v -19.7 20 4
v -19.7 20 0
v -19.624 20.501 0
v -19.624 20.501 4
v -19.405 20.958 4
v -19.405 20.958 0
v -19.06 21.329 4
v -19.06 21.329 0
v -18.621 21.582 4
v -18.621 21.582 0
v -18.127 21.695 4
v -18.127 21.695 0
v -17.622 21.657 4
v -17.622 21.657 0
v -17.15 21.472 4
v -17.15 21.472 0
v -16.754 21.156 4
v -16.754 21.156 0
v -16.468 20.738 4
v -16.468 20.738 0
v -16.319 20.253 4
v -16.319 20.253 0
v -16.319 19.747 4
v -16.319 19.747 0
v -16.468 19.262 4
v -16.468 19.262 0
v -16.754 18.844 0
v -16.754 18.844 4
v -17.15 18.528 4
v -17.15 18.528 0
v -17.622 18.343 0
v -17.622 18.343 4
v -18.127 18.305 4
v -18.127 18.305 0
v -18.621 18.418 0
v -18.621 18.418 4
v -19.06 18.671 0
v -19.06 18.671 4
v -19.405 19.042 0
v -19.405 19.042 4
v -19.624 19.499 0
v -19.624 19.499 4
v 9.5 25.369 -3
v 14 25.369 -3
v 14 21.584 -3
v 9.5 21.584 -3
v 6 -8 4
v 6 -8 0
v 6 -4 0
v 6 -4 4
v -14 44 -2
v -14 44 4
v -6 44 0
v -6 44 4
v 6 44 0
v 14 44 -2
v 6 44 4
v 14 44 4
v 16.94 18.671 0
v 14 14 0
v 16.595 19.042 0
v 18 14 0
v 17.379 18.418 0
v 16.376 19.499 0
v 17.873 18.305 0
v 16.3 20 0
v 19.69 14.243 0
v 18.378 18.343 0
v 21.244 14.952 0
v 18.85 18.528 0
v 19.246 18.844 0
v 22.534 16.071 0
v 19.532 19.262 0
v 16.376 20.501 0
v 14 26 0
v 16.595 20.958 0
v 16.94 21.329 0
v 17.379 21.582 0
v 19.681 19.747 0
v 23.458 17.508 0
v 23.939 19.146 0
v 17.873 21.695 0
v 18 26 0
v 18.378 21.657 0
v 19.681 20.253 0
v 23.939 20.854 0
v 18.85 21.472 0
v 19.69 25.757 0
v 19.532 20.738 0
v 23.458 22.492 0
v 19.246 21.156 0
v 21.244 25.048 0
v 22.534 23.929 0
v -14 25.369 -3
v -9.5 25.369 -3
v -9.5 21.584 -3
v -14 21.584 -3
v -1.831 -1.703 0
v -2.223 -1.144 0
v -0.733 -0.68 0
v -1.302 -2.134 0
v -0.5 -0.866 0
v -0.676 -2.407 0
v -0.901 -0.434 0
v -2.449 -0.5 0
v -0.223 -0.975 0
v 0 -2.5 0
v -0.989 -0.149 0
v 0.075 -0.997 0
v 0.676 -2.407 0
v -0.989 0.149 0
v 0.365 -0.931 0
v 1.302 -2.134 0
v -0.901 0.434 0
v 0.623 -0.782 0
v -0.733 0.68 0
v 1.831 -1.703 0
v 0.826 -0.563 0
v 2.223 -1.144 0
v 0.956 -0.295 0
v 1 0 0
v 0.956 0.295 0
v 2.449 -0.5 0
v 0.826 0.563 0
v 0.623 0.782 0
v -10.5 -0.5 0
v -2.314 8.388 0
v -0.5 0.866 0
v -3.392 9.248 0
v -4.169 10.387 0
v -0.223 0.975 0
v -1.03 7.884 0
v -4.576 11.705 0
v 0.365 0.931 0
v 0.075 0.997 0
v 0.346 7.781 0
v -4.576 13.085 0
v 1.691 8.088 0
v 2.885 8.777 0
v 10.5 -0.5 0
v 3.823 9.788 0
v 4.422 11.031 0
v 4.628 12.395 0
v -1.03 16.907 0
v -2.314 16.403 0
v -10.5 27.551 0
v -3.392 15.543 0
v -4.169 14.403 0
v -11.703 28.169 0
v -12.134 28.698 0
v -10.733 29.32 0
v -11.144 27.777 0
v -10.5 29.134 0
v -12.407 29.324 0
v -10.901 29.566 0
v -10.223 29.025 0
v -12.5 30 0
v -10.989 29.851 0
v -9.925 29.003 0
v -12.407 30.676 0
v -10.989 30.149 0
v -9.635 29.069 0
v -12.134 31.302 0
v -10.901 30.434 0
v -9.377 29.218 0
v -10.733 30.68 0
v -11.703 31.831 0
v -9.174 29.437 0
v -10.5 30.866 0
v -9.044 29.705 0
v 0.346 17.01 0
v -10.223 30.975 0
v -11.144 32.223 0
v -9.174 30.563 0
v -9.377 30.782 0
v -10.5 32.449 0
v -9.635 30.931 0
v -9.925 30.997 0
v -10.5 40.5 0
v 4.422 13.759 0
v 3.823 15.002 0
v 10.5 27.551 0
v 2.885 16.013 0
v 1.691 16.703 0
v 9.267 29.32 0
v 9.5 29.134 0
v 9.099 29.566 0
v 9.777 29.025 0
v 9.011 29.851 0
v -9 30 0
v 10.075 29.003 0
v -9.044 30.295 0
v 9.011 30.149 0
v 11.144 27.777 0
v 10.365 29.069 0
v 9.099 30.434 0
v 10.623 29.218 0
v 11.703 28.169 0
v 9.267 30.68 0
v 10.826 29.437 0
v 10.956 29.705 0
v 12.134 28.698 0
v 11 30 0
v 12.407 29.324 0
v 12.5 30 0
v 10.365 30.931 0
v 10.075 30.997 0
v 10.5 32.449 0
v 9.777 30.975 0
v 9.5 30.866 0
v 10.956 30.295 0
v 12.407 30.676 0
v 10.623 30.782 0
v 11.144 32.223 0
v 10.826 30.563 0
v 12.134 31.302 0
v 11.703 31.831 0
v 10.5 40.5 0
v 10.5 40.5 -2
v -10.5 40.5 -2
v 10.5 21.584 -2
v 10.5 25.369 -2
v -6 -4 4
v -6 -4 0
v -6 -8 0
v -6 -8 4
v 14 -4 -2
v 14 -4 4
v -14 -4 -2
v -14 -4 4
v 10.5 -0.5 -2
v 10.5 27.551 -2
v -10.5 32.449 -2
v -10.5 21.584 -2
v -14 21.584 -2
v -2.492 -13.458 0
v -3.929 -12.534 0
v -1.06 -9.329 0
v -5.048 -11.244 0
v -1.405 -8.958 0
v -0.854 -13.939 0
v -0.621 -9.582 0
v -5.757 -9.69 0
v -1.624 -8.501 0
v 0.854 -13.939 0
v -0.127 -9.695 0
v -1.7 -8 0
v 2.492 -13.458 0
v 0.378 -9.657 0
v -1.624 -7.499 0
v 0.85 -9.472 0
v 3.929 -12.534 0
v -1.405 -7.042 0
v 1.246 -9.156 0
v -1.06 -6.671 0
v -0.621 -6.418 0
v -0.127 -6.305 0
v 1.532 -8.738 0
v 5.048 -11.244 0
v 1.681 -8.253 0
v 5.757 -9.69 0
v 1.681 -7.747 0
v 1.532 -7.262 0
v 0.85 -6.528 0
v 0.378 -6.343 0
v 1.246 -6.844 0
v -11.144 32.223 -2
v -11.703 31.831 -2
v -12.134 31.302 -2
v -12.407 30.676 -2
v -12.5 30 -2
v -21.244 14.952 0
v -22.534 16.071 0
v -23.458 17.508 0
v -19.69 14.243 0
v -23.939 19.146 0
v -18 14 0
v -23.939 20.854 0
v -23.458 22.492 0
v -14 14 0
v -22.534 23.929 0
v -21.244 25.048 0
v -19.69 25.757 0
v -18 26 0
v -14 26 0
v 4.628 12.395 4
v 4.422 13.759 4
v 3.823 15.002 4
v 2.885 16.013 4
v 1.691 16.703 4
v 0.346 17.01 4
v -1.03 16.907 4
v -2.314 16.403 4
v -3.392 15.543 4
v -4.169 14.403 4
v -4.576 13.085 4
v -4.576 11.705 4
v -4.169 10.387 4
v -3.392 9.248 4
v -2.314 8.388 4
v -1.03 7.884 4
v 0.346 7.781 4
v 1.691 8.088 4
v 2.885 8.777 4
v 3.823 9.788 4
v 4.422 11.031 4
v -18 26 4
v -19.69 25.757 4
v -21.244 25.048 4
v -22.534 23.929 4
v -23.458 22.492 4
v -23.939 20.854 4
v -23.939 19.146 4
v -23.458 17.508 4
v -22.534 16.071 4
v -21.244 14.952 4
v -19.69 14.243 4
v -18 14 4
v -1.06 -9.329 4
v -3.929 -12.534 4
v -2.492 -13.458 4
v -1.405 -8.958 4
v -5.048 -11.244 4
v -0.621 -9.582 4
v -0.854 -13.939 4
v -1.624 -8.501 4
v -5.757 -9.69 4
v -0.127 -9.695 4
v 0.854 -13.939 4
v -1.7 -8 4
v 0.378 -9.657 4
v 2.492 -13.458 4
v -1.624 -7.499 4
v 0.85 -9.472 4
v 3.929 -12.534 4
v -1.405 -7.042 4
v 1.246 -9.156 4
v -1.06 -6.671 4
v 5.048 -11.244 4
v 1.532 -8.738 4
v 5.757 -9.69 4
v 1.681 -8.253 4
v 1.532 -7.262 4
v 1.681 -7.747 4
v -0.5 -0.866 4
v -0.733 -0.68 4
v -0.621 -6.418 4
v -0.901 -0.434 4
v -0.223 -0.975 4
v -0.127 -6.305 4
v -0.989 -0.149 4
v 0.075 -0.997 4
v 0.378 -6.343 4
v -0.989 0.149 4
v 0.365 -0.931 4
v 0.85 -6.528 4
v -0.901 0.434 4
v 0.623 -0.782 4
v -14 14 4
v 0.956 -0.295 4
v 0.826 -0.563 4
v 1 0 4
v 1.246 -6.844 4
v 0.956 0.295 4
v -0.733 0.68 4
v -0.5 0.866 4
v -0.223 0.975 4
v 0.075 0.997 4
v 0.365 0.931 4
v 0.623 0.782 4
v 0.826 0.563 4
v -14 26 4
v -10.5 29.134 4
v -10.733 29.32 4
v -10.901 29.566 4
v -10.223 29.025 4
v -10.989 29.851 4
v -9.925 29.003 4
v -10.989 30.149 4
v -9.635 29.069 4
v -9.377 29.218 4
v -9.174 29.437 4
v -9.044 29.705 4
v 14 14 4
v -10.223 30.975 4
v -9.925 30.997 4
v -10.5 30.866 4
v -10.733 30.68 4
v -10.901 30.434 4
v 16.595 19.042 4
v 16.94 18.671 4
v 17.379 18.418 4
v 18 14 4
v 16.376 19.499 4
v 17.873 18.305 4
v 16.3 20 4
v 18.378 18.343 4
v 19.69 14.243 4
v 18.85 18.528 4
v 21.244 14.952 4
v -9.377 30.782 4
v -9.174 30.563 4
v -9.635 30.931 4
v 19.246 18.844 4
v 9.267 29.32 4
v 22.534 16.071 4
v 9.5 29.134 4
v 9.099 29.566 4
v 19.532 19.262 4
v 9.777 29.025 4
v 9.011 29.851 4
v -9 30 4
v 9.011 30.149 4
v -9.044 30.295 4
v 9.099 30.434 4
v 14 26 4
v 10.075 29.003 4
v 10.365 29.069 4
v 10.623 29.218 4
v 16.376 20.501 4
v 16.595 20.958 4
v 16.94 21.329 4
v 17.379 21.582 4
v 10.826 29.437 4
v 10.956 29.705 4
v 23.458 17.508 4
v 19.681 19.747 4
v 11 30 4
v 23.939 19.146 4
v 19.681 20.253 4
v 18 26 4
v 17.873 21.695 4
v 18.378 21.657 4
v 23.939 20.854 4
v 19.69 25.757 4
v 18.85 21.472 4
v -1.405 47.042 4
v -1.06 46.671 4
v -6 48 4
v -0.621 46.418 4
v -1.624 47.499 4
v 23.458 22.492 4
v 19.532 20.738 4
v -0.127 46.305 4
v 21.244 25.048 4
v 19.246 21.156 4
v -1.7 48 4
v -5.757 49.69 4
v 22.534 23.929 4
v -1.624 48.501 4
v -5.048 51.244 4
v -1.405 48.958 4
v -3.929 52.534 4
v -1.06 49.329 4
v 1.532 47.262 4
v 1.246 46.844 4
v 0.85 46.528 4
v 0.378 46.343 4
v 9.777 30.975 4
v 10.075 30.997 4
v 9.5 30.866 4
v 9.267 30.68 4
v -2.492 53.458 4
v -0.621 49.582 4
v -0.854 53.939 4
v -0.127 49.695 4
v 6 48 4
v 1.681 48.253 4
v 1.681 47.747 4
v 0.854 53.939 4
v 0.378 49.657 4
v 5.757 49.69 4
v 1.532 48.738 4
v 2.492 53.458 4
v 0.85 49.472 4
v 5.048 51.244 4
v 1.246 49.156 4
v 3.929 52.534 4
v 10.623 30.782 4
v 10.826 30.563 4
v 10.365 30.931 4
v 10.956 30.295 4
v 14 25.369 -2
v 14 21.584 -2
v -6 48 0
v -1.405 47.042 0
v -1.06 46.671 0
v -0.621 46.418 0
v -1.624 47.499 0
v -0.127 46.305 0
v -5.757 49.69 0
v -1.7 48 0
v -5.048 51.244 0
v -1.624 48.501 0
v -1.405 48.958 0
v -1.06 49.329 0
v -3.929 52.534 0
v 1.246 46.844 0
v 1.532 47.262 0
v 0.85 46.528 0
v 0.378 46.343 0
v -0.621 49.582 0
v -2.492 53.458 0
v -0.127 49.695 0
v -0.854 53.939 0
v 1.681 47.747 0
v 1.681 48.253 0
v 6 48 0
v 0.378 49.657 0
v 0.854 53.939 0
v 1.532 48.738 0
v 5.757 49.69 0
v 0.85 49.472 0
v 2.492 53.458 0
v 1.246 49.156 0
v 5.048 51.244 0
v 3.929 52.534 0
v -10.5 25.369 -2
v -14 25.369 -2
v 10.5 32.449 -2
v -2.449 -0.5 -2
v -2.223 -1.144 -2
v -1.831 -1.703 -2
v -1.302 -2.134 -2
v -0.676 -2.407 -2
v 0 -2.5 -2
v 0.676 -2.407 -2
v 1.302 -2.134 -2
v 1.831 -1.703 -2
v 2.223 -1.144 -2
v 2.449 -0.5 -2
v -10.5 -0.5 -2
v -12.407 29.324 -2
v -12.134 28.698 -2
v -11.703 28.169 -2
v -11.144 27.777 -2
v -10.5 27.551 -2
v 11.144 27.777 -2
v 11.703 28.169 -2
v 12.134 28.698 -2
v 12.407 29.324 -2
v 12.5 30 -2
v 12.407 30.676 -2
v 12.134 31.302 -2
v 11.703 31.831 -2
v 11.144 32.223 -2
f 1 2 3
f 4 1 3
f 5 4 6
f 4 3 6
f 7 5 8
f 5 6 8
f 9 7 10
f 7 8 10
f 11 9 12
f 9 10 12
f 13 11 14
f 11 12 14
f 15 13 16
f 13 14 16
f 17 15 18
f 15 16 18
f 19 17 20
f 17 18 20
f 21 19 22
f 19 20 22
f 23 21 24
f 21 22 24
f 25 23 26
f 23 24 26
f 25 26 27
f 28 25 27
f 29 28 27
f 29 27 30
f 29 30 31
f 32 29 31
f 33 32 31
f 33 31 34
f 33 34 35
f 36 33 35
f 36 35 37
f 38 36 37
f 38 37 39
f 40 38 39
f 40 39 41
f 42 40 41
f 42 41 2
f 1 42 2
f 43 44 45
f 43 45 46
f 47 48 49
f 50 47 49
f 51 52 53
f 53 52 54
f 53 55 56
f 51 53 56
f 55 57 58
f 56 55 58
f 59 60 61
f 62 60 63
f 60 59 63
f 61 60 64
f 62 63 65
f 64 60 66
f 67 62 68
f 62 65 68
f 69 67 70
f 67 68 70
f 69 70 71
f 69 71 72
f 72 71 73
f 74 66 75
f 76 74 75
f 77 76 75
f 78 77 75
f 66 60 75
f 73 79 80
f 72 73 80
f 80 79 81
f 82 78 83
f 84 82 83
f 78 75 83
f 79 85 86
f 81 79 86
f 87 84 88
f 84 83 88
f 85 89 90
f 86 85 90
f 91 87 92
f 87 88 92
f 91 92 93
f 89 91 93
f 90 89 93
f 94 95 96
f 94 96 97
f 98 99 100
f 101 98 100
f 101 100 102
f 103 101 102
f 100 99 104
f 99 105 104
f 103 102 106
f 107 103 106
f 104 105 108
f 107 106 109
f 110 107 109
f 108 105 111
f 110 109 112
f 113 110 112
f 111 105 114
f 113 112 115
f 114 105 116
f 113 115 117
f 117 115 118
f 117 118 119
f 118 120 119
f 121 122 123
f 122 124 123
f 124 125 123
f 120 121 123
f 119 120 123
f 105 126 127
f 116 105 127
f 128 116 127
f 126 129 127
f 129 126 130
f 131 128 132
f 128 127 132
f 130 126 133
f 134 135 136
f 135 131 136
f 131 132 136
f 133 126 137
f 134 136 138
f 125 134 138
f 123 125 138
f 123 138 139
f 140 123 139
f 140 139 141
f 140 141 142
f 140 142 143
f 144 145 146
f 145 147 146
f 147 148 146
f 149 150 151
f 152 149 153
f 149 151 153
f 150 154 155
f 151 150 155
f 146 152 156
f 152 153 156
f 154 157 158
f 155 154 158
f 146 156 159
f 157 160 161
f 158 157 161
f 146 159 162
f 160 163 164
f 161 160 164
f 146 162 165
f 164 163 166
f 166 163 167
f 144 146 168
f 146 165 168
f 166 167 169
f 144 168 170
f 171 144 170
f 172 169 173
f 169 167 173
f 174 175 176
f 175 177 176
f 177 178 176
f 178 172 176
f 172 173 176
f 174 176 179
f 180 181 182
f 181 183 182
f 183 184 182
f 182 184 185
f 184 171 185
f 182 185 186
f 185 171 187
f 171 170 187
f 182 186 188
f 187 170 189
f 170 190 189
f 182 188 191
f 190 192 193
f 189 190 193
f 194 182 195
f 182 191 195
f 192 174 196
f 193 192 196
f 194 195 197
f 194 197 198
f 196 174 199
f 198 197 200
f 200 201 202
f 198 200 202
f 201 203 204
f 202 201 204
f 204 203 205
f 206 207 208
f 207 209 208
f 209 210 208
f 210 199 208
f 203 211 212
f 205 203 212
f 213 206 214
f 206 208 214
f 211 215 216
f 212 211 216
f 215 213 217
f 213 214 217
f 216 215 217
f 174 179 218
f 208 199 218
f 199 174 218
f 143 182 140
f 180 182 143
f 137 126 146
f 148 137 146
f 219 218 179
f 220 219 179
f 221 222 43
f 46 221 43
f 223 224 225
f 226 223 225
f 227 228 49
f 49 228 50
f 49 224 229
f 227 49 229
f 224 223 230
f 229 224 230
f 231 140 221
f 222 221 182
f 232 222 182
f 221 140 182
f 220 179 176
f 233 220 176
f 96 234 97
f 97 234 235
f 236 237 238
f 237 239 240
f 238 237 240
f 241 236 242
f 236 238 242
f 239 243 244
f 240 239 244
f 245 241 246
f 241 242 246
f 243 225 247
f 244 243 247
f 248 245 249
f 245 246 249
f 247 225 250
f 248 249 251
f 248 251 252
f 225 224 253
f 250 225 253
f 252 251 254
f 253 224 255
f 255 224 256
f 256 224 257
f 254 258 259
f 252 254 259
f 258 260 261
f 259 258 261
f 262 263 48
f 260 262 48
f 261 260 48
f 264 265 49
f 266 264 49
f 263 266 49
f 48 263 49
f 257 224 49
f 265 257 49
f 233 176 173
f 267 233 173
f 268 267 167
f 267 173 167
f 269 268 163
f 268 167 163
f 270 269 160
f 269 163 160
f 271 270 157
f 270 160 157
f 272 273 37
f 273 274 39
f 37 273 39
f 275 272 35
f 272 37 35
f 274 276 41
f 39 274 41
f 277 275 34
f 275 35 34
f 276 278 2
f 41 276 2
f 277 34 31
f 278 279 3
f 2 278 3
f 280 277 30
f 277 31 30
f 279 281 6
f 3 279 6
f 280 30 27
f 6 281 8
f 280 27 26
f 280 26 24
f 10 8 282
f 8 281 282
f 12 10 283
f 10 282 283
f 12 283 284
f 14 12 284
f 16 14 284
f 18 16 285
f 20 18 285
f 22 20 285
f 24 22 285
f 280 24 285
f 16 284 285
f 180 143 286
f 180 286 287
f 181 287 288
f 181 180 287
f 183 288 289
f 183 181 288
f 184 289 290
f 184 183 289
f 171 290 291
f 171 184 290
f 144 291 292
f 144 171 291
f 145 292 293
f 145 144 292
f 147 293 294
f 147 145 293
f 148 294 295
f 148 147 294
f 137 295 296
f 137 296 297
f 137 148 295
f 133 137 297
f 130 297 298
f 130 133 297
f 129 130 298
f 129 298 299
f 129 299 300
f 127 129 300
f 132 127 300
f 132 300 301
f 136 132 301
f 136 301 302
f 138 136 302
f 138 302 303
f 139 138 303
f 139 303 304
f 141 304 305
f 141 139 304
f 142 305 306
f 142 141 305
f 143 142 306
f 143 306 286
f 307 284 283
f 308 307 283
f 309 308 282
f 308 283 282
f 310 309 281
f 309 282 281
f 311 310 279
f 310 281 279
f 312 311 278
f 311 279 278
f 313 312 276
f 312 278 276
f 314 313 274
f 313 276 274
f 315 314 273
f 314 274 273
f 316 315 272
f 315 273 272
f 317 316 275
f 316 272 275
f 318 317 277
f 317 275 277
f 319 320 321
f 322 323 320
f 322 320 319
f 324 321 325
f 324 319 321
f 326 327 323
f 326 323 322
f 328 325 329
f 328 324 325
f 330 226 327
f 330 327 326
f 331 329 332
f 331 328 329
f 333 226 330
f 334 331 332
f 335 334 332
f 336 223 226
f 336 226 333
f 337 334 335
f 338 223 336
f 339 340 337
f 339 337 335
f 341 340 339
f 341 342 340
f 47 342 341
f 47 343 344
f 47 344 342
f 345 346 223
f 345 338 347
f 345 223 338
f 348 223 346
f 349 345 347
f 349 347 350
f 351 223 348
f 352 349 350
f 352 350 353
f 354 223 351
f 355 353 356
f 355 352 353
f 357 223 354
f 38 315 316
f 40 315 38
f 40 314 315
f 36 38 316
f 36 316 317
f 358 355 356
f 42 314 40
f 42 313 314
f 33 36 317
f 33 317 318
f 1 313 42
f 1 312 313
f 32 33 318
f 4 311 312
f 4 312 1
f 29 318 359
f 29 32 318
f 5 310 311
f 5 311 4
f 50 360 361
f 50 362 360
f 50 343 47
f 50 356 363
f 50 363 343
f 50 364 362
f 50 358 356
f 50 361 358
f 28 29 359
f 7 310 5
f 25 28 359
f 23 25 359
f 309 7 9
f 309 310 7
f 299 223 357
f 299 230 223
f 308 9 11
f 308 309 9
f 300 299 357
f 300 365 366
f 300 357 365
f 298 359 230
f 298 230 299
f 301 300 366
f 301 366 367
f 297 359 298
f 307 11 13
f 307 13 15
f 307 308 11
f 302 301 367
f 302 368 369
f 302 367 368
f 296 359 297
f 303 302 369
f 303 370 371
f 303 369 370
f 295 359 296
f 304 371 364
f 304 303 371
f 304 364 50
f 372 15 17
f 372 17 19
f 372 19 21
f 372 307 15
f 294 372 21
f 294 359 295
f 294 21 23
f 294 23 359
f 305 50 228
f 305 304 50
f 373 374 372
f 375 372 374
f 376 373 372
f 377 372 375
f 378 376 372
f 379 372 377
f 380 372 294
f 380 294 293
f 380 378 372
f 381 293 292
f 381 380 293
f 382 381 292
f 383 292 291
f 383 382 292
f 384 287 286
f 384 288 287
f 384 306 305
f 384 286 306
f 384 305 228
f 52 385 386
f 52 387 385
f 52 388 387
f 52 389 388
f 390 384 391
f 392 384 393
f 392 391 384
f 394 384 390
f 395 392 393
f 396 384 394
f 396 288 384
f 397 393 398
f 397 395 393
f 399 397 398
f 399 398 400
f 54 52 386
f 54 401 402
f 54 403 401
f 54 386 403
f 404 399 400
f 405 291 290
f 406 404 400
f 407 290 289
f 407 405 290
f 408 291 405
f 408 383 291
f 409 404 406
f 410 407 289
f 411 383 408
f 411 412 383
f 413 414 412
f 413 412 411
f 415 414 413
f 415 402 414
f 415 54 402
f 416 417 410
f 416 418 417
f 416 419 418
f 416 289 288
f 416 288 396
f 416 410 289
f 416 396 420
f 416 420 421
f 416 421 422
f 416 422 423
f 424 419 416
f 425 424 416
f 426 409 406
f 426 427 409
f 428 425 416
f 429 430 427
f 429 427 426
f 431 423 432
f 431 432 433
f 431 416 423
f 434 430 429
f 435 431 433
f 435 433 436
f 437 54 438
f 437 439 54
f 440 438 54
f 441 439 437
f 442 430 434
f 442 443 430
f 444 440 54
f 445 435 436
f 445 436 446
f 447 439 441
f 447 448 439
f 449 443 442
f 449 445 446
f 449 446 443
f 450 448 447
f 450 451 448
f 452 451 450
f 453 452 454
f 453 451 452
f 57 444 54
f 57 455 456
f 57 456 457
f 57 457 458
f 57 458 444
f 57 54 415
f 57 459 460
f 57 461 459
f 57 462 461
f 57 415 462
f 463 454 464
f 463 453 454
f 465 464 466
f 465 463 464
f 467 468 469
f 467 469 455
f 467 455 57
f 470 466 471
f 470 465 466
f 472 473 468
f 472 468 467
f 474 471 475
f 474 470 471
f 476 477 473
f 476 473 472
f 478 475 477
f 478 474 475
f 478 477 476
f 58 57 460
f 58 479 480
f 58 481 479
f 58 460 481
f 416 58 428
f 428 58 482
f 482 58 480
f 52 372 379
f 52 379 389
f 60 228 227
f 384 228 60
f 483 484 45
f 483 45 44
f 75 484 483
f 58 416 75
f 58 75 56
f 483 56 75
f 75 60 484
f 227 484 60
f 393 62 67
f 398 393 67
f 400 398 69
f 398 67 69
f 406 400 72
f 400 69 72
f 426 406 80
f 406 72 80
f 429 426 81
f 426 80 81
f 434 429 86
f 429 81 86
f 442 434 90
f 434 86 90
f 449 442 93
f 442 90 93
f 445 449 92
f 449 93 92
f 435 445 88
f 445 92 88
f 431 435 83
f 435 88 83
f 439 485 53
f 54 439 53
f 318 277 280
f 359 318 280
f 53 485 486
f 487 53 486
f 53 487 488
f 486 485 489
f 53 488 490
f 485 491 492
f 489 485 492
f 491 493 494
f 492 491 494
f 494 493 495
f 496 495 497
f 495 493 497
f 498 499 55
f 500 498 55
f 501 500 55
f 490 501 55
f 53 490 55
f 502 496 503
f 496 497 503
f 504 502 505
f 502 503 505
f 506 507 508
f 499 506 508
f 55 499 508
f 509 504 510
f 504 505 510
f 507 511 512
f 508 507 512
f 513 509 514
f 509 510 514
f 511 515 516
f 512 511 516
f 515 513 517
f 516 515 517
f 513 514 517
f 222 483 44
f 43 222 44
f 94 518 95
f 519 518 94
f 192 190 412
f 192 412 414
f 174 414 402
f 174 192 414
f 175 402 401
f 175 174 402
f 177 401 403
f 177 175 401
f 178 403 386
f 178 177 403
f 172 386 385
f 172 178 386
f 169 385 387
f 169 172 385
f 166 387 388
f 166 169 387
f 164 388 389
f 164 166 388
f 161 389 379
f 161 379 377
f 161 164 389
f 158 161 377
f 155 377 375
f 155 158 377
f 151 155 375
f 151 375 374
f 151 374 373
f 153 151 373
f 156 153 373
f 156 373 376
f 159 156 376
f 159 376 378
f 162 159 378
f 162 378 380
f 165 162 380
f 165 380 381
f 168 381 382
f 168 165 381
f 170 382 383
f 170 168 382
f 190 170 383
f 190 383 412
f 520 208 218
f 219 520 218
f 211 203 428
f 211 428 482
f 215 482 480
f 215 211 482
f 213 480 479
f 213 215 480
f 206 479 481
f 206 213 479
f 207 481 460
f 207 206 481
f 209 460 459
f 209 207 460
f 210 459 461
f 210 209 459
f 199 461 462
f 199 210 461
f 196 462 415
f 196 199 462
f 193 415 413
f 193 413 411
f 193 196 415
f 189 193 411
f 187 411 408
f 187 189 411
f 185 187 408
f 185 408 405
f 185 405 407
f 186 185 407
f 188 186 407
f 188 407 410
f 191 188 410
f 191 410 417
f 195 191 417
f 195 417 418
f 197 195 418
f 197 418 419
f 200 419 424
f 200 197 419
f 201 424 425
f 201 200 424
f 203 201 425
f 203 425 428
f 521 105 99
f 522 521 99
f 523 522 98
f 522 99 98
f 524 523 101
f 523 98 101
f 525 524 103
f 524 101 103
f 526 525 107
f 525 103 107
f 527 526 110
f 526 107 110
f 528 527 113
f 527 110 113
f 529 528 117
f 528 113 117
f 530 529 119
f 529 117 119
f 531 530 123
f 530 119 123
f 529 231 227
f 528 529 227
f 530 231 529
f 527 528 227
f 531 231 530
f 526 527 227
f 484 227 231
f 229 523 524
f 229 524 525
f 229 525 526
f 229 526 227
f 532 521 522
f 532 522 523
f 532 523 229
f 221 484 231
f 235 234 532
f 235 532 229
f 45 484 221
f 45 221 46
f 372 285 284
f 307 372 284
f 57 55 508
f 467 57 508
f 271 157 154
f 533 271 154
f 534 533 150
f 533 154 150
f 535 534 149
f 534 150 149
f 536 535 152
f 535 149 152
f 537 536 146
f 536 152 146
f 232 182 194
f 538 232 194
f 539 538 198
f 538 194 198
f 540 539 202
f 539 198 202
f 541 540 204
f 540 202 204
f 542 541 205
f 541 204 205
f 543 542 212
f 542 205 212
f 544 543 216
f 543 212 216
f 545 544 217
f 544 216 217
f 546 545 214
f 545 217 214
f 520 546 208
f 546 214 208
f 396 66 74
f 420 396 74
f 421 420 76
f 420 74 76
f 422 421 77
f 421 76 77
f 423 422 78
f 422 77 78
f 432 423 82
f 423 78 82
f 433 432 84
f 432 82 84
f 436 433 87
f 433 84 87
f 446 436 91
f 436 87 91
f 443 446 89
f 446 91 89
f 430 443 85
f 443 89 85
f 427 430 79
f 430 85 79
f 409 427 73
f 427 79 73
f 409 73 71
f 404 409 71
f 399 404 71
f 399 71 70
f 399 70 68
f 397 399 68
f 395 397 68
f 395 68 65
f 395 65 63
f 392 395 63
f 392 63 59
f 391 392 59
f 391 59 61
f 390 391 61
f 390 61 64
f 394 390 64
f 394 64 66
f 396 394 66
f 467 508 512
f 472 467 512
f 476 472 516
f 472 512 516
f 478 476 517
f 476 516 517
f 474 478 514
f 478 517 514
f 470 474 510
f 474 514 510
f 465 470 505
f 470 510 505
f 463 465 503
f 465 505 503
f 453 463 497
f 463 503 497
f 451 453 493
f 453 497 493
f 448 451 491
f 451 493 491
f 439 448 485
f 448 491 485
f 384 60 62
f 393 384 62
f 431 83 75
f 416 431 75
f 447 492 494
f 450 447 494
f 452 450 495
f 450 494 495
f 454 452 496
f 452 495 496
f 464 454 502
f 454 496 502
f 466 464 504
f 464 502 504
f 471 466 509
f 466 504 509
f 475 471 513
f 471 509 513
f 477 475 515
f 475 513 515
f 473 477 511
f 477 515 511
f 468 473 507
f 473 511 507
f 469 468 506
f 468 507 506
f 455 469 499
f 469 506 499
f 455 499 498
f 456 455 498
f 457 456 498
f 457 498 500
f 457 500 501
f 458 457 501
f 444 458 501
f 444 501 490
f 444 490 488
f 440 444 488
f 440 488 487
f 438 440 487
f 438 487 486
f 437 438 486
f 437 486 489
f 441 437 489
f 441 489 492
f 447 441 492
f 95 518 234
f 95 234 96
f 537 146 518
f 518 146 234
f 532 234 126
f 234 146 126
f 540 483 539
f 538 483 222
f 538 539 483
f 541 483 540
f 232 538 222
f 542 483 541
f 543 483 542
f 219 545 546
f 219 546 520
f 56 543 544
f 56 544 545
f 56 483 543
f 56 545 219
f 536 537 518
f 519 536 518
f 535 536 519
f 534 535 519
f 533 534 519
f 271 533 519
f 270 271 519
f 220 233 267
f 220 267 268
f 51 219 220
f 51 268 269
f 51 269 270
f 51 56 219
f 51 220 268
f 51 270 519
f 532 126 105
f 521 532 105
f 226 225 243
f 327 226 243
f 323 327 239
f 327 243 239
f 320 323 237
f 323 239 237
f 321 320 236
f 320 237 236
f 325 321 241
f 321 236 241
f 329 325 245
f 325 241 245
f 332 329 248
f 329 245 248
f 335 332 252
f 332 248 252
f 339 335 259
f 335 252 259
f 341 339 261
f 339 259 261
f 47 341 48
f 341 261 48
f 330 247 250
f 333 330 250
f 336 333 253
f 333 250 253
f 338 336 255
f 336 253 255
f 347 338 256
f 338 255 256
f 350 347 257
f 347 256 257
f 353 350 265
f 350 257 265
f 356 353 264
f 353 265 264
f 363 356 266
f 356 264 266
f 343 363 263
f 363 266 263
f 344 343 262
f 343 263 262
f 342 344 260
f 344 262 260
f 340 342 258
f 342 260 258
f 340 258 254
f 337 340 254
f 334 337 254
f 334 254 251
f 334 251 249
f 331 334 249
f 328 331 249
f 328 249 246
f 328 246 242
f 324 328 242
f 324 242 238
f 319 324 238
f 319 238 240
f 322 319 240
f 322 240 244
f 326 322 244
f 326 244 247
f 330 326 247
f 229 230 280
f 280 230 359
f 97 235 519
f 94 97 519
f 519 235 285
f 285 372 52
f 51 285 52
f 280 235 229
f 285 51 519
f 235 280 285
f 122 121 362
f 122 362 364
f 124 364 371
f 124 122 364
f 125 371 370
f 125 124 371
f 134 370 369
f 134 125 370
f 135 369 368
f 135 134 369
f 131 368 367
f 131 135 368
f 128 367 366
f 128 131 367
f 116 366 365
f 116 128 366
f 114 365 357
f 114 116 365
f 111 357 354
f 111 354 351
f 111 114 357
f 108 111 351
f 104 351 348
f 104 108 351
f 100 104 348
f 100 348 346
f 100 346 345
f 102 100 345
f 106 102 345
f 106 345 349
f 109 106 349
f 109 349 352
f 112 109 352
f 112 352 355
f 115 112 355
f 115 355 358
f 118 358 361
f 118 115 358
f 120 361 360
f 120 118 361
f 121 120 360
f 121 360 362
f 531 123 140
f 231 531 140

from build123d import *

# Parameters (mm, degrees)
SKETCH1_R           = 4.627548386
SKETCH1_R_2         = 1
BOSS_EXTRUDE1_DEPTH = 4
BOSS_EXTRUDE3_DEPTH = 2
SKETCH5_W           = 4.5
SKETCH5_H           = 3.78546494
BOSS_EXTRUDE4_DEPTH = 1
CUT_EXTRUDE1_DEPTH  = 47.280842529
D_GAGEMENT_M31_D    = 3.4


with BuildPart() as part:
    # Sketch1 → Boss-Extrude1 (new body)
    # profile 1 of 9: a face of its own
    with BuildSketch(Plane.XY):
        with BuildLine():
            Line((-6, 44), (-14, 44))
            Line((-14, 44), (-14, 26))
            Line((-14, 26), (-10, 26))
            ThreePointArc((-10, 26), (-4, 20), (-10, 14))
            Line((-10, 14), (-14, 14))
            Line((-14, 14), (-14, -4))
            Line((-14, -4), (-6, -4))
            Line((-6, -4), (-6, 0))
            ThreePointArc((-6, 0), (0, 6), (6, 0))
            Line((6, 0), (6, -4))
            Line((6, -4), (14, -4))
            Line((14, -4), (14, 14))
            Line((14, 14), (10, 14))
            ThreePointArc((10, 14), (4, 20), (10, 26))
            Line((10, 26), (14, 26))
            Line((14, 26), (14, 44))
            Line((14, 44), (6, 44))
            Line((6, 44), (6, 40))
            ThreePointArc((6, 40), (0, 34), (-6, 40))
            Line((-6, 40), (-6, 44))
        make_face()
        with Locations((0, 12.3952)):
            Circle(SKETCH1_R, mode=Mode.SUBTRACT)
        with Locations((-10, 30)):
            Circle(SKETCH1_R_2, mode=Mode.SUBTRACT)
        with Locations((10, 30)):
            Circle(SKETCH1_R_2, mode=Mode.SUBTRACT)
    # profile 2 of 9: a face of its own
    with BuildSketch(Plane.XY):
        with BuildLine():
            Line((-14, 14), (-14, 26))
            Line((-14, 26), (-18, 26))
            ThreePointArc((-18, 26), (-24, 20), (-18, 14))
            Line((-18, 14), (-14, 14))
        make_face()
    # profile 3 of 9: a face of its own
    with BuildSketch(Plane.XY):
        with BuildLine():
            Line((-10, 26), (-14, 26))
            Line((-14, 26), (-14, 14))
            Line((-14, 14), (-10, 14))
            ThreePointArc((-10, 14), (-4, 20), (-10, 26))
        make_face()
    # profile 4 of 9: a face of its own
    with BuildSketch(Plane.XY):
        with BuildLine():
            Line((6, 44), (-6, 44))
            Line((-6, 44), (-6, 40))
            ThreePointArc((-6, 40), (0, 34), (6, 40))
            Line((6, 40), (6, 44))
        make_face()
    # profile 5 of 9: a face of its own
    with BuildSketch(Plane.XY):
        with BuildLine():
            Line((-6, 48), (-6, 44))
            Line((-6, 44), (6, 44))
            Line((6, 44), (6, 48))
            ThreePointArc((6, 48), (0, 54), (-6, 48))
        make_face()
    # profile 6 of 9: a face of its own
    with BuildSketch(Plane.XY):
        with BuildLine():
            Line((14, 14), (14, 26))
            Line((14, 26), (10, 26))
            ThreePointArc((10, 26), (4, 20), (10, 14))
            Line((10, 14), (14, 14))
        make_face()
    # profile 7 of 9: a face of its own
    with BuildSketch(Plane.XY):
        with BuildLine():
            Line((18, 26), (14, 26))
            Line((14, 26), (14, 14))
            Line((14, 14), (18, 14))
            ThreePointArc((18, 14), (24, 20), (18, 26))
        make_face()
    # profile 8 of 9: a face of its own
    with BuildSketch(Plane.XY):
        with BuildLine():
            Line((-6, 0), (-6, -4))
            Line((-6, -4), (6, -4))
            Line((6, -4), (6, 0))
            ThreePointArc((6, 0), (0, 6), (-6, 0))
        make_face()
        Circle(SKETCH1_R_2, mode=Mode.SUBTRACT)
    # profile 9 of 9: a face of its own
    with BuildSketch(Plane.XY):
        with BuildLine():
            Line((6, -4), (-6, -4))
            Line((-6, -4), (-6, -8))
            ThreePointArc((-6, -8), (0, -14), (6, -8))
            Line((6, -8), (6, -4))
        make_face()
    extrude(amount=BOSS_EXTRUDE1_DEPTH)

    # Sketch4 → Boss-Extrude3 (add)
    with BuildSketch(Plane(origin=(0, 0, 0), x_dir=(-1, 0, 0), z_dir=(0, 0, -1))):
        Polygon((-6, 44), (-14, 44), (-14, 26), (-14, 14), (-14, -4), (-6, -4), (6, -4), (14, -4), (14, 14), (14, 26), (14, 44), (6, 44), align=None)
        with BuildLine():
            Line((-10.5, 32.449489743), (-10.5, 40.5))
            Line((-10.5, 40.5), (10.5, 40.5))
            Line((10.5, 40.5), (10.5, 32.449489743))
            ThreePointArc((10.5, 32.449489743), (11.936491673, 31.58113883), (12.5, 30))
            ThreePointArc((12.5, 30), (11.936491673, 28.41886117), (10.5, 27.550510257))
            Line((10.5, 27.550510257), (10.5, -0.5))
            Line((10.5, -0.5), (2.449489743, -0.5))
            ThreePointArc((2.449489743, -0.5), (0, -2.5), (-2.449489743, -0.5))
            Line((-2.449489743, -0.5), (-10.5, -0.5))
            Line((-10.5, -0.5), (-10.5, 27.550510257))
            ThreePointArc((-10.5, 27.550510257), (-12.5, 30), (-10.5, 32.449489743))
        make_face(mode=Mode.SUBTRACT)
    extrude(amount=BOSS_EXTRUDE3_DEPTH)

    # Sketch5 → Boss-Extrude4 (add)
    with BuildSketch(Plane(origin=(0, 0, -2), x_dir=(-1, 0, 0), z_dir=(0, 0, -1))):
        with Locations((-11.75, 23.476244976)):
            Rectangle(SKETCH5_W, SKETCH5_H)
        with Locations((11.75, 23.476244976)):
            Rectangle(SKETCH5_W, SKETCH5_H)
    extrude(amount=BOSS_EXTRUDE4_DEPTH)

    # Sketch7 → Cut-Extrude1 (cut, through all)
    with BuildSketch(Plane(origin=(0, 25.368977446, 0), x_dir=(1, 0, 0), z_dir=(0, 1, 0))):
        Polygon((-10.5, 2), (-9.5, 3), (-9.5, 2), align=None)
        Polygon((10.5, 2), (9.5, 3), (9.5, 2), align=None)
    extrude(amount=-CUT_EXTRUDE1_DEPTH, mode=Mode.SUBTRACT)

    # Dégagement M31 (through all)
    with Locations(Plane.XY.offset(4)):
        with Locations((0, 48), (0, -8), (-18, 20), (18, 20)):
            Hole(D_GAGEMENT_M31_D / 2)


solid = part.part
